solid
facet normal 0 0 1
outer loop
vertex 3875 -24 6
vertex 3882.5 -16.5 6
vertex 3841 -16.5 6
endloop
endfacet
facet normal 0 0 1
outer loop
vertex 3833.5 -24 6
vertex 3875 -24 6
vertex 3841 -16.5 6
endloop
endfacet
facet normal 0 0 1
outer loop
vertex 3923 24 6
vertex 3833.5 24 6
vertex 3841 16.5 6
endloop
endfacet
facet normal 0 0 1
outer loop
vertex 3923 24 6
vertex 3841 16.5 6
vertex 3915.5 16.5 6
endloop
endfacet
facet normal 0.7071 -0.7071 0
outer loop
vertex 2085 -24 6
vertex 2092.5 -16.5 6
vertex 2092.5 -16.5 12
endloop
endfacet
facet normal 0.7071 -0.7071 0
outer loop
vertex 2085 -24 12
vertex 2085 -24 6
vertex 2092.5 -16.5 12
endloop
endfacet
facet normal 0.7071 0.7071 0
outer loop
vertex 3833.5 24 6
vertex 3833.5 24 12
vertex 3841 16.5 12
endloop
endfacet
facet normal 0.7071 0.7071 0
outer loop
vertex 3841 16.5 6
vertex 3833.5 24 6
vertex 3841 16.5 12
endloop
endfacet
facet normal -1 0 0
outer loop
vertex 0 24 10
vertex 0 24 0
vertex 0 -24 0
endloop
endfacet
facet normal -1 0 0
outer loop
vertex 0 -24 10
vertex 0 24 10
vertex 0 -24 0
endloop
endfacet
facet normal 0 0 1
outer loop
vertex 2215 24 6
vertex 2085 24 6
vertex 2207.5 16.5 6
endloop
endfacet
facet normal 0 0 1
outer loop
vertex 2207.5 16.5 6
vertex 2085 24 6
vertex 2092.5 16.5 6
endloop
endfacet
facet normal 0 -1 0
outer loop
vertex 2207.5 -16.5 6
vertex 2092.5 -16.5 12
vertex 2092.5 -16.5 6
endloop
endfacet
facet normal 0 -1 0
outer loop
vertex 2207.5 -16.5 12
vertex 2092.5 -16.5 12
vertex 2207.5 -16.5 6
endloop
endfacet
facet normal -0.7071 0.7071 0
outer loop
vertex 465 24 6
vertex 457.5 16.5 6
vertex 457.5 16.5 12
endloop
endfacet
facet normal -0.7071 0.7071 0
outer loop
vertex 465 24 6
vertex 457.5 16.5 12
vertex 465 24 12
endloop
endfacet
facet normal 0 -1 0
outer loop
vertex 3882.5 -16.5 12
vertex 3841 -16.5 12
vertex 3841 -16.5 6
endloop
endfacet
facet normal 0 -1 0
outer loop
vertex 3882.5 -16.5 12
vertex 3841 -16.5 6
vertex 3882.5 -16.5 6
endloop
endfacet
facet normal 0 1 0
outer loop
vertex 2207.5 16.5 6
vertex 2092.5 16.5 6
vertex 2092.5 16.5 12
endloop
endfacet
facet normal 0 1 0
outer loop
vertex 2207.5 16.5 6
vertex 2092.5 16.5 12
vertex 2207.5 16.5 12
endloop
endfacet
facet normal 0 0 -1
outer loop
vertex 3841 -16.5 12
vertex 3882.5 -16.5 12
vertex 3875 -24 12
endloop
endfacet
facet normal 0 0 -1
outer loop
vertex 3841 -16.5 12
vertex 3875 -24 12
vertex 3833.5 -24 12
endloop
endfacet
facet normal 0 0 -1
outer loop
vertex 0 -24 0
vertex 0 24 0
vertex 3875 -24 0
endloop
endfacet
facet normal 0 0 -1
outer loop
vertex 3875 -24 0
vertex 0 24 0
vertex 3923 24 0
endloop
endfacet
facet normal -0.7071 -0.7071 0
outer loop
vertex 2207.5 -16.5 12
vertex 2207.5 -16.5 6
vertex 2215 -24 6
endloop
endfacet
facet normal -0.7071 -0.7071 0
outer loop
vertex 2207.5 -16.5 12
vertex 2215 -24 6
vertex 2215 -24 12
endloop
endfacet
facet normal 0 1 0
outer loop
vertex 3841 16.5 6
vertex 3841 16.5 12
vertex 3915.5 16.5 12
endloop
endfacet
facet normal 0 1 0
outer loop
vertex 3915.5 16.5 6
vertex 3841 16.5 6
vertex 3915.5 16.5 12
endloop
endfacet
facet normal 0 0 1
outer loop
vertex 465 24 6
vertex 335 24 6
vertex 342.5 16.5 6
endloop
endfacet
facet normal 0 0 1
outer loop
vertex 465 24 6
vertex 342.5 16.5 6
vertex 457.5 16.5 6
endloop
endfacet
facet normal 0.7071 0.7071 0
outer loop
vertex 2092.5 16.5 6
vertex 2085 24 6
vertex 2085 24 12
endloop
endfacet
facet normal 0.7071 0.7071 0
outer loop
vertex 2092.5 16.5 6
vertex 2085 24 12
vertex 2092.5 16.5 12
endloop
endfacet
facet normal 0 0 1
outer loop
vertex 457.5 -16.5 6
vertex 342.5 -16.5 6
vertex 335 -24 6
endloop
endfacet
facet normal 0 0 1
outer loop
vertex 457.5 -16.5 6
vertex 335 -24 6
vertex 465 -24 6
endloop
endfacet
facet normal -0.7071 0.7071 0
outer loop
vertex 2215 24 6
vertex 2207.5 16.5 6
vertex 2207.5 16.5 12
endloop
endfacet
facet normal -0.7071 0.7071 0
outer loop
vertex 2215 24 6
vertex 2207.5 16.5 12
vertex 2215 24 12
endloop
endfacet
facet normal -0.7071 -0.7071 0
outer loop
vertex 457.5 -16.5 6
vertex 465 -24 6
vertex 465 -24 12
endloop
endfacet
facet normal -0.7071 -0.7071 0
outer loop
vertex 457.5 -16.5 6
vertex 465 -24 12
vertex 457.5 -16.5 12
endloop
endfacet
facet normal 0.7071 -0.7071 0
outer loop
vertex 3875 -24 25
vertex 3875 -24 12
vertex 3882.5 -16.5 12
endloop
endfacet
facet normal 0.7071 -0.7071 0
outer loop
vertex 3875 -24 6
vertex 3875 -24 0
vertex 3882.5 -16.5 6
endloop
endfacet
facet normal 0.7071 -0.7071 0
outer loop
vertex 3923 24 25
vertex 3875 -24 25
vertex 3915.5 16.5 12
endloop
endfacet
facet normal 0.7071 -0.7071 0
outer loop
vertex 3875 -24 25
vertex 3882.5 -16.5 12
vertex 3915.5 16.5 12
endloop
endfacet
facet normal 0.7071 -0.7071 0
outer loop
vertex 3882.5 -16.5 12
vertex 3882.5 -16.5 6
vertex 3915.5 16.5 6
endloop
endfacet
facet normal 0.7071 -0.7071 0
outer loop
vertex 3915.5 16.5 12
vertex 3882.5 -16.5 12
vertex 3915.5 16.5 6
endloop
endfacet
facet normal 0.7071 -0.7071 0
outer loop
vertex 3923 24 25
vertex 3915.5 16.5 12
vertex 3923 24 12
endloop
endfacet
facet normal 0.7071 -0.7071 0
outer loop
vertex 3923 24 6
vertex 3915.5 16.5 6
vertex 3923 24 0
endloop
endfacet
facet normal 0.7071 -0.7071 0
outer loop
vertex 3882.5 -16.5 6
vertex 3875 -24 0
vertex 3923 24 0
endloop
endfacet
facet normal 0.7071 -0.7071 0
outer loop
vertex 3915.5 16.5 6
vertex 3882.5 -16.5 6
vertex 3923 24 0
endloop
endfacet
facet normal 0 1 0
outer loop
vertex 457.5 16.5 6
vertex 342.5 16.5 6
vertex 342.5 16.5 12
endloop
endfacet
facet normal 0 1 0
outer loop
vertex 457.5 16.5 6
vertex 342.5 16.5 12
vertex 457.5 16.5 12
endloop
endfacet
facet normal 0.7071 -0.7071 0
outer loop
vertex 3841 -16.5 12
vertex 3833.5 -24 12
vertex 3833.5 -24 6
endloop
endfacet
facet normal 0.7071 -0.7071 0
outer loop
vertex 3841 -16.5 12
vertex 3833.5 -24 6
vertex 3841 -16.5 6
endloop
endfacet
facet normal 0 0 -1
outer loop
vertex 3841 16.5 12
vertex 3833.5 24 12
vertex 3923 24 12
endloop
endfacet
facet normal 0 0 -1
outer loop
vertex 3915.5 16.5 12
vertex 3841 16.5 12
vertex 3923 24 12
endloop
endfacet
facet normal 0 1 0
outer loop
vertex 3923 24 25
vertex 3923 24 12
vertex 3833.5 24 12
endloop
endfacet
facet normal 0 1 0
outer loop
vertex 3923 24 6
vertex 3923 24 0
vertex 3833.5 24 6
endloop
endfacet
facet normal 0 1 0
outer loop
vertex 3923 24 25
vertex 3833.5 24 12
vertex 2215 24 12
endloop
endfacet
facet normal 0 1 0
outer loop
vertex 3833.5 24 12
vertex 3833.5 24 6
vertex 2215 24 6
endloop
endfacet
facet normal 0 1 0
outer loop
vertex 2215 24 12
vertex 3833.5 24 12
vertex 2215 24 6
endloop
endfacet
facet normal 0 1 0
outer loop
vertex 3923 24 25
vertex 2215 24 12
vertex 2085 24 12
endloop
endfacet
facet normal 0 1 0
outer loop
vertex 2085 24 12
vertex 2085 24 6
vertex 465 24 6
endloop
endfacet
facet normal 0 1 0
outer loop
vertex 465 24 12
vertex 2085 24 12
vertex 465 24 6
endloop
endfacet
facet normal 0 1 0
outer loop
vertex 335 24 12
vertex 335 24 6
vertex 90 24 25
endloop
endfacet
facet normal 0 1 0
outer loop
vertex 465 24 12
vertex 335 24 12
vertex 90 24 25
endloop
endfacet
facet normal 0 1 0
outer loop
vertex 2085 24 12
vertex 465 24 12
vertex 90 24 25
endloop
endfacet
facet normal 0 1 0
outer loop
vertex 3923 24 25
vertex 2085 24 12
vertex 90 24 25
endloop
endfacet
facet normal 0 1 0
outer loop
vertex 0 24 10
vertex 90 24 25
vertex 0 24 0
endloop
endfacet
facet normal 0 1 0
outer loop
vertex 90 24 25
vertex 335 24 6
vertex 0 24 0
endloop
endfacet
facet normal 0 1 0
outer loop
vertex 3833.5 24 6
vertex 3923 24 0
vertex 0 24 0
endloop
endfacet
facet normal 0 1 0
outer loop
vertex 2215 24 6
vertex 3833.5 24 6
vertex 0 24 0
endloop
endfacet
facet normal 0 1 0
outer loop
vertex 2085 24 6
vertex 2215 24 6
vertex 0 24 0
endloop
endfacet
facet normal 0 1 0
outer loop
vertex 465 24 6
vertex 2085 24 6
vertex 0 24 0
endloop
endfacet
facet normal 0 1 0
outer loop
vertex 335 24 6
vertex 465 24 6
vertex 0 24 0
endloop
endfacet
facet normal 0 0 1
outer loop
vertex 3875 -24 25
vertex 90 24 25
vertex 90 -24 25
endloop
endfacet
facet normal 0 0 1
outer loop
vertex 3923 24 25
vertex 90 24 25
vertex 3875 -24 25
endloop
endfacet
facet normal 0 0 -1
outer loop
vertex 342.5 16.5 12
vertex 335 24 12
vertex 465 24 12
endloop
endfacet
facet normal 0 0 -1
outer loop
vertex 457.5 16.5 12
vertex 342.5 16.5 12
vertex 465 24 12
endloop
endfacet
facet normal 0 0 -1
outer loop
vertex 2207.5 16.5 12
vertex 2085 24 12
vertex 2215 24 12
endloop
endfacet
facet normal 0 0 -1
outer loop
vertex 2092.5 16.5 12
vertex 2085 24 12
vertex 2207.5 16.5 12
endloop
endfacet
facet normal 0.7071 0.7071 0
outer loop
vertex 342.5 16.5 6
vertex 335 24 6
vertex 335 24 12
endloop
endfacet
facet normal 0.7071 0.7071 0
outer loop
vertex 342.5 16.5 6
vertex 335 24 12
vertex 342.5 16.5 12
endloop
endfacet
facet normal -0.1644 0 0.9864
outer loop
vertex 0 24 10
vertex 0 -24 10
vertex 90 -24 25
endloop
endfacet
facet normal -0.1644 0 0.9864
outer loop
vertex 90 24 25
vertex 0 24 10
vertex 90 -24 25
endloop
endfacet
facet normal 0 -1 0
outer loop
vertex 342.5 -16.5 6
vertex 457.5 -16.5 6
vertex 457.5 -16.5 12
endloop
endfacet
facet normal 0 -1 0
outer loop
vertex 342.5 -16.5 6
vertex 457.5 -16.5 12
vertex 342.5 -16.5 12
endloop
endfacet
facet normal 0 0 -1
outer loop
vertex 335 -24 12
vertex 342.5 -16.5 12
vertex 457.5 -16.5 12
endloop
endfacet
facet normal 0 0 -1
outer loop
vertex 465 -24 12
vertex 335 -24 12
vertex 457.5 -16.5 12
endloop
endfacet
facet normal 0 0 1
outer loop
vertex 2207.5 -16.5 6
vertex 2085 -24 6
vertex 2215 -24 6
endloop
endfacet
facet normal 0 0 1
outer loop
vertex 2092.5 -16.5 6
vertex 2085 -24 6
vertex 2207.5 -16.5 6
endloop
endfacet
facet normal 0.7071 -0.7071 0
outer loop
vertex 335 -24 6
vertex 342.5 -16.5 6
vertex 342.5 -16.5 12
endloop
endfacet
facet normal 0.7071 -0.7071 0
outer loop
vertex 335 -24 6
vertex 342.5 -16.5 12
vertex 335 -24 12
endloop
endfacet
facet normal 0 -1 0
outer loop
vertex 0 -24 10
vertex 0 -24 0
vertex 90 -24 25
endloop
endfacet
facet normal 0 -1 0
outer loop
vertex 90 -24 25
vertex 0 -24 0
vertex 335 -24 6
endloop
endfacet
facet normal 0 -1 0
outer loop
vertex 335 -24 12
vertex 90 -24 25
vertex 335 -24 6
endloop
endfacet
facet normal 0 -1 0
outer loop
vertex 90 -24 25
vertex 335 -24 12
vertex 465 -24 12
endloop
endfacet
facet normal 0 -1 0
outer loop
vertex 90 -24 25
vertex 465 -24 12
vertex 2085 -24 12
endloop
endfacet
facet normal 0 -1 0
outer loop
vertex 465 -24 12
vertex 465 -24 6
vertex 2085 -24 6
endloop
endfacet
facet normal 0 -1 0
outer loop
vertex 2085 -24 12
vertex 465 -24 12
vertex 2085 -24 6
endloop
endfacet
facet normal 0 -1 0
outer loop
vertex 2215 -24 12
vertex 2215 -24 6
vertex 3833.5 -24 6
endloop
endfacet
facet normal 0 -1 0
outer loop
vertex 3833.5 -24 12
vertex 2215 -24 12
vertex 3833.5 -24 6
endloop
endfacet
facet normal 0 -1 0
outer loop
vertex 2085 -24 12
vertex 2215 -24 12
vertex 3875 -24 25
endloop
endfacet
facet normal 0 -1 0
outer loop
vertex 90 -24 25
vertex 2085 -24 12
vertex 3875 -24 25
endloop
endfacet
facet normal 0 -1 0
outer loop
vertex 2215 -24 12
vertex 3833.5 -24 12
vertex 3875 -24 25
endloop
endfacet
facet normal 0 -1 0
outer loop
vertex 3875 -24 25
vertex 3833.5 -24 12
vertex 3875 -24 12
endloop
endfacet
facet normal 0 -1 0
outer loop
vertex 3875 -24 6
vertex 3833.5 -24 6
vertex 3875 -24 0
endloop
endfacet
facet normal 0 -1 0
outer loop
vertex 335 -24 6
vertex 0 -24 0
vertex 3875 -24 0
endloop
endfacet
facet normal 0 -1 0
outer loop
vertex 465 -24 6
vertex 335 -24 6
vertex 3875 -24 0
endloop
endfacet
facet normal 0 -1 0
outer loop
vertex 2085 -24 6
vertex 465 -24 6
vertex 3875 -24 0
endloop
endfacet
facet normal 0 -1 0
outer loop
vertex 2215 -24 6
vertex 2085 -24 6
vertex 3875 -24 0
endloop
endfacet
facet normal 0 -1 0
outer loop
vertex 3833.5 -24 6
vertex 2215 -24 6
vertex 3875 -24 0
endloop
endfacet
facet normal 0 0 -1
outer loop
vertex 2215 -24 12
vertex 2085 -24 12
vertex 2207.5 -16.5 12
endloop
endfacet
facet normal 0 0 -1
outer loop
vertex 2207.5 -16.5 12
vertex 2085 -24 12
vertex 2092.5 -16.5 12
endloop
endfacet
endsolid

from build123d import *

# Parameters (mm, degrees)
EXTRUDE_1_DEPTH        = 25
SKETCH_2_W             = 115
SKETCH_2_H             = 6
CUT_EXTRUDE_1_DEPTH    = 7.5
DRAFT_1_ANGLE          = 45
MIRROR_START           = 6
MIRROR_1_DEPTH         = 6
PATTERN_START          = 6
PATTERN_LINEAR_1_DEPTH = 6
CUT_EXTRUDE_START      = -13
CUT_EXTRUDE_2_DEPTH    = 6
CUT_EXTRUDE_3_REACH    = 3925.373


# Read off the part's stored shape, not the designer's step: 镜向1, 阵列(线性)1
with BuildPart() as part:
    # 草图1 → 凸台-拉伸1 (new body)
    with BuildSketch(Plane.XY):
        Polygon((0, 24), (0, -24), (3875, -24), (3923, 24), align=None)
    extrude(amount=EXTRUDE_1_DEPTH)

    # 草图2 → 切除-拉伸1 (cut)
    with BuildSketch(Plane.XZ.offset(24)):
        with Locations((2150, 9)):
            Rectangle(SKETCH_2_W, SKETCH_2_H)
    extrude(amount=-CUT_EXTRUDE_1_DEPTH, mode=Mode.SUBTRACT)

    # 拔模1
    draft_1_faces = [part.faces().sort_by_distance(p)[0] for p in [
        (2207.5, -20.25, 9),
        (2092.5, -20.25, 9),
    ]]
    draft(draft_1_faces, Plane(origin=(0, -16.5, 0), x_dir=(0, 0, -1), z_dir=(0, -1, 0)), DRAFT_1_ANGLE)

    # 镜向1 outline → 镜向1 (cut)
    with BuildSketch(Plane.XY.offset(MIRROR_START)):
        Polygon((2092.5, 16.5), (2207.5, 16.5), (2215, 24), (2085, 24), align=None)
    extrude(amount=MIRROR_1_DEPTH, mode=Mode.SUBTRACT)

    # 阵列(线性)1 outline → 阵列(线性)1 (cut)
    with BuildSketch(Plane.XY.offset(PATTERN_START)):
        Polygon((457.5, 16.5), (465, 24), (335, 24), (342.5, 16.5), align=None)
        Polygon((465, -24), (457.5, -16.5), (342.5, -16.5), (335, -24), align=None)
    extrude(amount=PATTERN_LINEAR_1_DEPTH, mode=Mode.SUBTRACT)

    # 草图4 → 切除-拉伸2 (cut)
    with BuildSketch(Plane.XY.offset(25).offset(CUT_EXTRUDE_START)):
        Polygon((3833.5, 24), (3841, 16.5), (3915.5, 16.5), (3923, 24), align=None)
        Polygon((3833.5, -24), (3841, -16.5), (3882.5, -16.5), (3875, -24), align=None)
    extrude(amount=-CUT_EXTRUDE_2_DEPTH, mode=Mode.SUBTRACT)

    # 草图5 → 切除-拉伸3 (cut, up to next)
    with BuildSketch(Plane.XZ.offset(24), mode=Mode.PRIVATE) as cut_extrude_3_sk1:
        Polygon((0, 10), (90, 25), (0, 25), align=None)
    cut_extrude_3_tool1 = extrude(cut_extrude_3_sk1.sketch, amount=-CUT_EXTRUDE_3_REACH, mode=Mode.PRIVATE) & part.part
    add(cut_extrude_3_tool1.solids().sort_by_distance((30, -24, 20))[0], mode=Mode.SUBTRACT)


solid = part.part
